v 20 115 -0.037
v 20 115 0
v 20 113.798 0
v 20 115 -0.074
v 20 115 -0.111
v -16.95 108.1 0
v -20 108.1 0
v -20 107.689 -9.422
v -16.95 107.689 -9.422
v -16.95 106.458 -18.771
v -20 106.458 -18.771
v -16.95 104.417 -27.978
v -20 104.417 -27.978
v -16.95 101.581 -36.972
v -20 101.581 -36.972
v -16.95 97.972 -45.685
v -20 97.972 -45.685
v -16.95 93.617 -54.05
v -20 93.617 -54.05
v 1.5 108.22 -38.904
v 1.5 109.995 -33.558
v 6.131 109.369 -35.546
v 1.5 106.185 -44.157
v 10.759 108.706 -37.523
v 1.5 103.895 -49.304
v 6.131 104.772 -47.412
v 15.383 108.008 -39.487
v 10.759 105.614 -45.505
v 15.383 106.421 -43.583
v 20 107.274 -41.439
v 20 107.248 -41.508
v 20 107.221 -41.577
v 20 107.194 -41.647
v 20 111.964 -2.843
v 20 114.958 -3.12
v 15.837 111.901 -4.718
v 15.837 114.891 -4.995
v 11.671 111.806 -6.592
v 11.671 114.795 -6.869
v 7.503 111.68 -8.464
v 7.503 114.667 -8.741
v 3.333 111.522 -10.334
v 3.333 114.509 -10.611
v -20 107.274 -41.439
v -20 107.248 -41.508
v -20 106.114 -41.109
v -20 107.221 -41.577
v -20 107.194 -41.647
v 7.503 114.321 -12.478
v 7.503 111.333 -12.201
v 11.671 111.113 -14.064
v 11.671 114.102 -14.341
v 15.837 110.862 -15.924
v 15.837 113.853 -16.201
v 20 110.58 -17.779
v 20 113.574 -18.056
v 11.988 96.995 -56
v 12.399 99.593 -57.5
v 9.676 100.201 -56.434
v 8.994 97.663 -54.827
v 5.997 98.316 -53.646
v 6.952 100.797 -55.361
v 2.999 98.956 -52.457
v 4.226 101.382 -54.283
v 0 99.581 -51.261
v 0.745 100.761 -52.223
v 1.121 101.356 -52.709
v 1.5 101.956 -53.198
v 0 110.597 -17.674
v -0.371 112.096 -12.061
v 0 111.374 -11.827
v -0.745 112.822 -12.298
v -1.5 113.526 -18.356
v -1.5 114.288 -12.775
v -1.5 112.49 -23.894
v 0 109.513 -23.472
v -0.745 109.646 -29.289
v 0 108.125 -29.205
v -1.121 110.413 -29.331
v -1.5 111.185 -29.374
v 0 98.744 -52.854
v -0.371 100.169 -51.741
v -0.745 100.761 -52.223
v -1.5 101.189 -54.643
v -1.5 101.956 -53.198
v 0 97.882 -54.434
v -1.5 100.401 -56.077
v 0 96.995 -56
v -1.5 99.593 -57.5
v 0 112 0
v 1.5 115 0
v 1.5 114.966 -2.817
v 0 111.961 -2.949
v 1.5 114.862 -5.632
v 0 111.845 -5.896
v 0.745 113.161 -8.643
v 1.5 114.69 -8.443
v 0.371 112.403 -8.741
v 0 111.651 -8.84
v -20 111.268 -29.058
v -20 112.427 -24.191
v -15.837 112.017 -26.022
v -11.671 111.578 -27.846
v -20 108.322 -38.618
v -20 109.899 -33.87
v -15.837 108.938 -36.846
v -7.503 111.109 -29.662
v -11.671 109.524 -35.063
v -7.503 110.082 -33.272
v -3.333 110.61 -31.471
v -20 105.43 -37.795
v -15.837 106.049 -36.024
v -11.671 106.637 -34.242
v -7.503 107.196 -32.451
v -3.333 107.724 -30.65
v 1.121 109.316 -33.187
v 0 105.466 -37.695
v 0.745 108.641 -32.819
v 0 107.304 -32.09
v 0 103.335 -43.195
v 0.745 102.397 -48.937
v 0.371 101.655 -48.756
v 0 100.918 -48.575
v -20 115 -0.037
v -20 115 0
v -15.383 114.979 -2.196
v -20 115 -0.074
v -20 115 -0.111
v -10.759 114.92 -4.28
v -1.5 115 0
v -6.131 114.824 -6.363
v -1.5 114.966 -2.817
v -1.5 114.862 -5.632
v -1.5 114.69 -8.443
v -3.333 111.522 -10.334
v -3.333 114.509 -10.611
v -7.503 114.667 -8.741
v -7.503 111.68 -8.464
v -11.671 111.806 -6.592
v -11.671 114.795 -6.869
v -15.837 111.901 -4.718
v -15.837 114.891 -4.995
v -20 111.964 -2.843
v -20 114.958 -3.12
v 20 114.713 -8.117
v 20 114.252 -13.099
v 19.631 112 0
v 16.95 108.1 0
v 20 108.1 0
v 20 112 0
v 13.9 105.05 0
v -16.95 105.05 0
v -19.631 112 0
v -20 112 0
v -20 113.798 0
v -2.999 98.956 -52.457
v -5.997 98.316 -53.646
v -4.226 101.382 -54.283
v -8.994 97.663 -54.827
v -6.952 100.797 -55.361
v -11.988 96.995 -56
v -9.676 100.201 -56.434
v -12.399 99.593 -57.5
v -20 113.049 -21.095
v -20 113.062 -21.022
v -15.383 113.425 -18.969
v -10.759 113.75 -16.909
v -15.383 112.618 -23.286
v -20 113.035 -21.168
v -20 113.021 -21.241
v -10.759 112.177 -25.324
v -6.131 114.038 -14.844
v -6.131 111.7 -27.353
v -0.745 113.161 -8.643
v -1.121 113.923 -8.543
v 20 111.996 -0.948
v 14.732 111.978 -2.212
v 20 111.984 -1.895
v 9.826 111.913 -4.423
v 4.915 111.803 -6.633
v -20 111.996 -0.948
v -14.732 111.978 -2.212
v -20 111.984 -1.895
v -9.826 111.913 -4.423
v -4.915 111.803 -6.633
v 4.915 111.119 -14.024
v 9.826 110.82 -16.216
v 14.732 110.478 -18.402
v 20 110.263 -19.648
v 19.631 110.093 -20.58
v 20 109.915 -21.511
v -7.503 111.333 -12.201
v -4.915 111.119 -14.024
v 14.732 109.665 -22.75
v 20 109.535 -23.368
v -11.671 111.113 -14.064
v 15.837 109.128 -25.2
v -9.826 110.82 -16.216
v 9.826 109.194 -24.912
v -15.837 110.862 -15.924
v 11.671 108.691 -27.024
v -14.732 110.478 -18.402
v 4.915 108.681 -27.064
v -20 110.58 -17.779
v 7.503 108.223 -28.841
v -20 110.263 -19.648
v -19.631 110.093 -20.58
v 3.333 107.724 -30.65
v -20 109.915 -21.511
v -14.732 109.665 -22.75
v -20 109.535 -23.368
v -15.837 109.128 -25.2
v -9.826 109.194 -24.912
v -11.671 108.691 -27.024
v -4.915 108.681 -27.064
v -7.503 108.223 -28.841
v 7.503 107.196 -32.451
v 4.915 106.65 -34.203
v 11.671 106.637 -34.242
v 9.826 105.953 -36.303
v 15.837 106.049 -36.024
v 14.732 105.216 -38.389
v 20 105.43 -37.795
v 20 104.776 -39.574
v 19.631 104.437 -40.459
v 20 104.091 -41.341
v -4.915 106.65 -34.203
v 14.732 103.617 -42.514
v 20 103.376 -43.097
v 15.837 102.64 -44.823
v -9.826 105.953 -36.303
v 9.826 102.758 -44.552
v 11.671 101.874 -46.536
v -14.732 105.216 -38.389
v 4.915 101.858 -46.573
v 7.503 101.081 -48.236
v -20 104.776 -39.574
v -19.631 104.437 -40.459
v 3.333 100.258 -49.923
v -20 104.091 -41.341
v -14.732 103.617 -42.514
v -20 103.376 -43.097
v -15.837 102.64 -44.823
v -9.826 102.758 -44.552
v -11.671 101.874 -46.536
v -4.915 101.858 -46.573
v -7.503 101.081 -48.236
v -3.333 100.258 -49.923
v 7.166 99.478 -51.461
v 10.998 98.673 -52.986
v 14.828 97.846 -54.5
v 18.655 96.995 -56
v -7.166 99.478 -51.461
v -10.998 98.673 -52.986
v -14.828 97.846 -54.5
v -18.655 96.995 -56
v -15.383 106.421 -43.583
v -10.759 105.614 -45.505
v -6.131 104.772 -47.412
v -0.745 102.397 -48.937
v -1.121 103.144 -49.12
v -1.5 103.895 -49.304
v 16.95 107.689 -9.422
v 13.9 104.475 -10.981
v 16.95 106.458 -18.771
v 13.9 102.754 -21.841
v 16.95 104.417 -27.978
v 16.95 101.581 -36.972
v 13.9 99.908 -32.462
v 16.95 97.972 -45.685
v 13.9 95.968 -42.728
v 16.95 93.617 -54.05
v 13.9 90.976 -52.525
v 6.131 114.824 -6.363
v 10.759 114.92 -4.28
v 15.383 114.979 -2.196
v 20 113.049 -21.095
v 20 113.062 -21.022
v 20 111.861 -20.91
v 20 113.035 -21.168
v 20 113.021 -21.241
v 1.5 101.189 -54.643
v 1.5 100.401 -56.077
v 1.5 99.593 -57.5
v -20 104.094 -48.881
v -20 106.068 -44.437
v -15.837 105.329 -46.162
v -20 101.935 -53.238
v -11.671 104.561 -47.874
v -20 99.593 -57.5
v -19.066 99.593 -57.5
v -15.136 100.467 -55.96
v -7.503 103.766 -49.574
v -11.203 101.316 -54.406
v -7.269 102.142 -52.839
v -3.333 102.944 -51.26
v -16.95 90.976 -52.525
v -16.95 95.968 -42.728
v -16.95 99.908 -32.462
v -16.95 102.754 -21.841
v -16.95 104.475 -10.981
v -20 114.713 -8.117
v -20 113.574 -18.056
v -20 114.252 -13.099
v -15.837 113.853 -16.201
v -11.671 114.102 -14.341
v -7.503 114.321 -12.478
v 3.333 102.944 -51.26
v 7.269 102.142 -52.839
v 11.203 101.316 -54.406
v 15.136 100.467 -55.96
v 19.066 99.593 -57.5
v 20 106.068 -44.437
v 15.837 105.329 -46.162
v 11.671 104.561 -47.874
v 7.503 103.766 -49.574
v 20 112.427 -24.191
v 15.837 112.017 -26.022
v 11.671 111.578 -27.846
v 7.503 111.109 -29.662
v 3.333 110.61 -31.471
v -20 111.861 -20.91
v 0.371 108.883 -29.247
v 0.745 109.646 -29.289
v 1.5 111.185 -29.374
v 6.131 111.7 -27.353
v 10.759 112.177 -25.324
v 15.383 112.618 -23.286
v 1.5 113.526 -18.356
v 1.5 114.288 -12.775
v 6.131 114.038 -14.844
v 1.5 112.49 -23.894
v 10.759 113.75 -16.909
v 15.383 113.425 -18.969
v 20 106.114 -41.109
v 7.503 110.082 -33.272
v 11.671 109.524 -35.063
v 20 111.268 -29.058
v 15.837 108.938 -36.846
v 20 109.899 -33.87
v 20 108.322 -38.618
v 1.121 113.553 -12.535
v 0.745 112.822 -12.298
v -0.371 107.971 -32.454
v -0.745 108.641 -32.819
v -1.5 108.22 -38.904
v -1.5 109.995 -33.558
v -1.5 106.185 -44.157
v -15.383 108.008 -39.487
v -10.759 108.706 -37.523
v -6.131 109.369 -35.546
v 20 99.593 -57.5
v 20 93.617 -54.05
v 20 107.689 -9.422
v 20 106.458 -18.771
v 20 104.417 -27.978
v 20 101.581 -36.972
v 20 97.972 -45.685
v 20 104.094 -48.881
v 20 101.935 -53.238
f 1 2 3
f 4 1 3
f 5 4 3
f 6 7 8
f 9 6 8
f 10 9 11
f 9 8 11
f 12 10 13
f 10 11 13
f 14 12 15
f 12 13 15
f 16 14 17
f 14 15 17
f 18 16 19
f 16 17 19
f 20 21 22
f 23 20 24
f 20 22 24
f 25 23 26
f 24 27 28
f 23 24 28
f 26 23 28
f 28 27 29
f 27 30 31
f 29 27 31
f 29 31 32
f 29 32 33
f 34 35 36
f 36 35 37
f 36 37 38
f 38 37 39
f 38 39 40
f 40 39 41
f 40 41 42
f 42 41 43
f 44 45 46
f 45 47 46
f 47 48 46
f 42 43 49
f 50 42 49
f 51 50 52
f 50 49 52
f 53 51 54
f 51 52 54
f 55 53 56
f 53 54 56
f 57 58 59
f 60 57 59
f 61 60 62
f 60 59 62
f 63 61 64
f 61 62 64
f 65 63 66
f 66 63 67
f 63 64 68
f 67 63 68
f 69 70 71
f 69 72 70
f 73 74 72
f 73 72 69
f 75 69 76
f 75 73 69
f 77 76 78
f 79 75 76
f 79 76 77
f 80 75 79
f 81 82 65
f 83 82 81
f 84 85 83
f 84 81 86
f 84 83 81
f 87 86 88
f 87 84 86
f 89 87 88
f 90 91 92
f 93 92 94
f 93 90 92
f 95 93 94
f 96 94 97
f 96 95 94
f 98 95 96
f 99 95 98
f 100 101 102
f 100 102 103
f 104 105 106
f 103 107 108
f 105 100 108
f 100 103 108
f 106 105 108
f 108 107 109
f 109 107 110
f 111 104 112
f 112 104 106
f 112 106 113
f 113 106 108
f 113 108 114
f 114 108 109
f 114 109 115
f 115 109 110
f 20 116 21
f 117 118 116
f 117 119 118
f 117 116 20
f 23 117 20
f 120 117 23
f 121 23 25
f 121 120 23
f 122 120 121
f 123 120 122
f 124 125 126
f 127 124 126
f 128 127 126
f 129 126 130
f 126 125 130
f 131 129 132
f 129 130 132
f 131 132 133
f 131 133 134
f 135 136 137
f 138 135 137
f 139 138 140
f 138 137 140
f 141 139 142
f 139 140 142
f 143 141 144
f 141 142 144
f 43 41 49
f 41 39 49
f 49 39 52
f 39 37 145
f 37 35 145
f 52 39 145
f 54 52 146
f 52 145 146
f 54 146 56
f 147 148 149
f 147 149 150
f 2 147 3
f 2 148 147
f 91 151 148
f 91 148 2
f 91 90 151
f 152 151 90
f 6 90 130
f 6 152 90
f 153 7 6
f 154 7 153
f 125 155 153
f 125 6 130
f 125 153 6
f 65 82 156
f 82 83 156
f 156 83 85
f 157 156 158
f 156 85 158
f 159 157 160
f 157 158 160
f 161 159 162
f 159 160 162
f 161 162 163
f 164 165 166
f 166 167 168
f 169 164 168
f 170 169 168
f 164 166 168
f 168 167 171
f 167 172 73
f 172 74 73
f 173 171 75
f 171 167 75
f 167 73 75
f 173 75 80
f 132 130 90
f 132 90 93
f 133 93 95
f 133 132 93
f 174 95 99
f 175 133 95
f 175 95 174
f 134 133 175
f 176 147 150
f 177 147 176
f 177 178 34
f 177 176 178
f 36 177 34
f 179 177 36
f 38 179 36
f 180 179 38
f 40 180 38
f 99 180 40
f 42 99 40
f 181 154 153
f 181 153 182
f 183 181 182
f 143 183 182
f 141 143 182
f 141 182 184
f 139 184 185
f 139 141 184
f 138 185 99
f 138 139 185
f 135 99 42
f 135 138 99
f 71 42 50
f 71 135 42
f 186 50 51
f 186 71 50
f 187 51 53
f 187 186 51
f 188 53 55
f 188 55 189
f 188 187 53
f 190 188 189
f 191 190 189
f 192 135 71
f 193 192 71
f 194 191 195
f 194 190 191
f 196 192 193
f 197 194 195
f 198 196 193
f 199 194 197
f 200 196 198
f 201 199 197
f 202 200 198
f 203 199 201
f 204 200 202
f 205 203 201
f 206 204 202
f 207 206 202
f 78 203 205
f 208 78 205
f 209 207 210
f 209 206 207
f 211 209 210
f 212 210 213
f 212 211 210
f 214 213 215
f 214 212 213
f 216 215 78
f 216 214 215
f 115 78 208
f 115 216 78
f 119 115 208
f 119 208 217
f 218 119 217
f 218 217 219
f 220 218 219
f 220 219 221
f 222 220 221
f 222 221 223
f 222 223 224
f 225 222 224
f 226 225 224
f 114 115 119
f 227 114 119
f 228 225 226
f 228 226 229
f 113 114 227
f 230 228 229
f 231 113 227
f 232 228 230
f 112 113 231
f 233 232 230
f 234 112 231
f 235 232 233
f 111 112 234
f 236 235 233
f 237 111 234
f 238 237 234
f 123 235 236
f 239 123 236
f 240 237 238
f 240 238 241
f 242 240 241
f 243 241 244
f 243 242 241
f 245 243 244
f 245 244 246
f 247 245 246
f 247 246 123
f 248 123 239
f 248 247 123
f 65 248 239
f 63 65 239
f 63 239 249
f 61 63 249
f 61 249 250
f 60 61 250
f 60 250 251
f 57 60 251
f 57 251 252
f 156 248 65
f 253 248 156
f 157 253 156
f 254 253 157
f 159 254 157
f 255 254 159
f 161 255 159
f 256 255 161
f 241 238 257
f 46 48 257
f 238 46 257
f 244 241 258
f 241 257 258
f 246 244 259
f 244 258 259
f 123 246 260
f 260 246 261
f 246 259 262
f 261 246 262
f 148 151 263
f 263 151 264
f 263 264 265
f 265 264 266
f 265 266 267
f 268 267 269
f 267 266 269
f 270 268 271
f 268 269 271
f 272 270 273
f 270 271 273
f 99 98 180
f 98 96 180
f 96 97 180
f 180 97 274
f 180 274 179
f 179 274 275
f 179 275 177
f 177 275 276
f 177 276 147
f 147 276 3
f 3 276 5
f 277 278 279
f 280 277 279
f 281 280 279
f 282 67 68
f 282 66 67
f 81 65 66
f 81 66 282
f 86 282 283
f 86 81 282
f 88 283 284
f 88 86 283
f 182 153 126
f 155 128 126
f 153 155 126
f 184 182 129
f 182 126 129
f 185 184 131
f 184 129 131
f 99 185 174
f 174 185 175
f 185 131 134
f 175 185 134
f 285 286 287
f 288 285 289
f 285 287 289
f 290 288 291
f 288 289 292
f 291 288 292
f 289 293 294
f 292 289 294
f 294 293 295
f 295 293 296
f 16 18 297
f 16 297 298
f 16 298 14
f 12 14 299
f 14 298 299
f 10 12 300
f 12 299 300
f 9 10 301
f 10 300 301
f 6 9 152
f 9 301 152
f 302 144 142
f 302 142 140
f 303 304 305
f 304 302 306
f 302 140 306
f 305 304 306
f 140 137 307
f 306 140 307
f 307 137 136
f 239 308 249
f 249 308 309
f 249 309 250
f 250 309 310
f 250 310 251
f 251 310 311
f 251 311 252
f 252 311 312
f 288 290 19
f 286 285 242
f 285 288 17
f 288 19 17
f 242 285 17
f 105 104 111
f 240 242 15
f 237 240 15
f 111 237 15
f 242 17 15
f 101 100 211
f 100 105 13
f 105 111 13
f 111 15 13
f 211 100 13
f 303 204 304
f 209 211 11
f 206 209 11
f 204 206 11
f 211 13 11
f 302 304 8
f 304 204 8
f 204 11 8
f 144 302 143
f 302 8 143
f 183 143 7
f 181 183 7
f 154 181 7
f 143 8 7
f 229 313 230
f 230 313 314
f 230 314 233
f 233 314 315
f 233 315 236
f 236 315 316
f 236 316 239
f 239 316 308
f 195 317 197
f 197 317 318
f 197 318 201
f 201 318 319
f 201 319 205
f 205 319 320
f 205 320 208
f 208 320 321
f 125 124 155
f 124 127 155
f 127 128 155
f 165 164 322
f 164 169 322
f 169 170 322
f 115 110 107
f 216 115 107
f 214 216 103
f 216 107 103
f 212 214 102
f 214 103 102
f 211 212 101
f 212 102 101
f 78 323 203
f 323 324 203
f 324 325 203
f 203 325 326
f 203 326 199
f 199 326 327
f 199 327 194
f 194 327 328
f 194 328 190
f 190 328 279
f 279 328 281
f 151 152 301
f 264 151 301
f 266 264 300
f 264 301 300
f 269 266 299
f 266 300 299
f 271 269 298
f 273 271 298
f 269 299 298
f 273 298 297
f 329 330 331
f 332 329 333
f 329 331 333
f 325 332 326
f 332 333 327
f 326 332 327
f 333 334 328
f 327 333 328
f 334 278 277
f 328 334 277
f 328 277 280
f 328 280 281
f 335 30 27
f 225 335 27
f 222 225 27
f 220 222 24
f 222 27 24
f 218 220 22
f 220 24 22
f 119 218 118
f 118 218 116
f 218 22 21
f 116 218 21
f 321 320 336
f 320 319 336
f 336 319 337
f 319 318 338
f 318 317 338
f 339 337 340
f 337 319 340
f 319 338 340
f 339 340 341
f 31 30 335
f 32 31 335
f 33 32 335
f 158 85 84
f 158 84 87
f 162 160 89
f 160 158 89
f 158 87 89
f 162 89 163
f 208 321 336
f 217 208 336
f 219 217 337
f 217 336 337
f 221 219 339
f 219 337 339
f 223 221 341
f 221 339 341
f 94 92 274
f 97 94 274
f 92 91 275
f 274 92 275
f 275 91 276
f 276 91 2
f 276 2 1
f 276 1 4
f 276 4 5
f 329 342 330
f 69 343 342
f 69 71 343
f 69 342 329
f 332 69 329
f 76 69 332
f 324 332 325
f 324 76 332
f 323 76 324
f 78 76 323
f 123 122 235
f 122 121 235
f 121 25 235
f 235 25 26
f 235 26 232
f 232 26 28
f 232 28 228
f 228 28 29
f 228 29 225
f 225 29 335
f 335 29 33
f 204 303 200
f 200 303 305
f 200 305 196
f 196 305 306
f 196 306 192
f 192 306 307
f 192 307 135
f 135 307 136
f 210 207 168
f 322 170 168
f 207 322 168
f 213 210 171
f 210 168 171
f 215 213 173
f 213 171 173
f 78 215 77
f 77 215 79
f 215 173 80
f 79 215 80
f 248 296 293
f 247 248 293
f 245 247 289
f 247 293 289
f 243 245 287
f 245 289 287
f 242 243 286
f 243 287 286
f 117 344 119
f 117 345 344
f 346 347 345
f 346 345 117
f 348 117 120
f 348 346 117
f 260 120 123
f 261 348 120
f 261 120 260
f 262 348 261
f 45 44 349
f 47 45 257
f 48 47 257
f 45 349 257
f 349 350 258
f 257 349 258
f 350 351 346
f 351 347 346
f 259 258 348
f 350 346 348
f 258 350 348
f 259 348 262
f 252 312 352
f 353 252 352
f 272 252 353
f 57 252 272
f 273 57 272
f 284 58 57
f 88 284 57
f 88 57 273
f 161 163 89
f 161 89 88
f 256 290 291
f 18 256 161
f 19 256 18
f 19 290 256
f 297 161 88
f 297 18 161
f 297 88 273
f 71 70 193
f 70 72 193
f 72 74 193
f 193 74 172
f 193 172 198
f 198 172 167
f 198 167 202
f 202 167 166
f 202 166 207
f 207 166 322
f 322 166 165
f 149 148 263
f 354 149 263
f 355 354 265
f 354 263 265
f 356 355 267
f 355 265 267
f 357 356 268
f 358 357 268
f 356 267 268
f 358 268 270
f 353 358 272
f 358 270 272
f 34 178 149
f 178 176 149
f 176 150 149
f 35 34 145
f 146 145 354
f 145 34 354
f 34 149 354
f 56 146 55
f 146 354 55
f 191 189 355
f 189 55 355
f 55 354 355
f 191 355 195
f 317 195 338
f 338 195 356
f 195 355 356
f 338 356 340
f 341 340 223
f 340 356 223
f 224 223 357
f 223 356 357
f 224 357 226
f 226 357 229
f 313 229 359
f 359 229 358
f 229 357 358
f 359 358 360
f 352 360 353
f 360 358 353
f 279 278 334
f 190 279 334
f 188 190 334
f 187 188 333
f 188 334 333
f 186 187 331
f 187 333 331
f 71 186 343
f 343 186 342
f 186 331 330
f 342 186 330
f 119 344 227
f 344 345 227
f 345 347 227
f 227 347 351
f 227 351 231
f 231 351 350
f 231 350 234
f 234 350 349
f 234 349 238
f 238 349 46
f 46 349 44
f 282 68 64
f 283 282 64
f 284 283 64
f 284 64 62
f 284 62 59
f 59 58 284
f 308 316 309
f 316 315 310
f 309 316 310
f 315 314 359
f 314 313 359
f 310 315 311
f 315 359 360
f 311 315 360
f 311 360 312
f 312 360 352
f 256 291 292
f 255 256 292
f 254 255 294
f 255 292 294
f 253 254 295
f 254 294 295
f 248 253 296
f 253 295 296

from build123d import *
from build123d.topology import SkipClean

# Parameters (mm, degrees)
CUT_EXTRUDE1_REACH      = 261.709
CUT_EXTRUDE1_END_RADIUS = 112
CIRPATTERN1_COUNT       = 34
SKETCH5_OUTSIDE_W       = 297.544
SKETCH5_OUTSIDE_H       = 297.544
CUT_EXTRUDE2_DEPTH      = 168.481342244


with BuildPart() as part:
    # Sketch1 → Revolve1 (revolve)
    with BuildSketch(Plane.XY, mode=Mode.PRIVATE) as revolve1_sk:
        Polygon((-20, 115), (20, 115), (20, 108.1), (16.95, 108.1), (13.9, 105.05), (-16.95, 105.05), (-16.95, 108.1), (-20, 108.1), align=None)
    revolve(revolve1_sk.sketch.rotate(Axis((22, 0, 0), (-1, 0, 0)), 90), axis=Axis((22, 0, 0), (-1, 0, 0)))

    # Cut-Extrude1: up to this cylinder (the profile starts outside it)
    cut_extrude1_end = Plane(origin=(0, 0, 0), z_dir=(-1, 0, 0)) * Cylinder(CUT_EXTRUDE1_END_RADIUS, 748.418, mode=Mode.PRIVATE)
    # Sketch3 → Cut-Extrude1 (cut, up to the surface)
    with BuildSketch(Plane.XY.offset(117), mode=Mode.PRIVATE) as cut_extrude1_sk1:
        Polygon((-20, 7.5), (-3.333333333, 0), (-20, -7.5), (-20, -10.5), (0, -1.5), (20, -10.5), (20, -7.5), (3.333333333, 0), (20, 7.5), (20, 10.5), (0, 1.5), (-20, 10.5), align=None)
    cut_extrude1_tool1 = extrude(cut_extrude1_sk1.sketch, amount=-CUT_EXTRUDE1_REACH, mode=Mode.PRIVATE) - cut_extrude1_end
    cut_extrude1 = cut_extrude1_tool1.solids().sort_by_distance((0, 0, 117))[0]
    add(cut_extrude1, mode=Mode.SUBTRACT)

    # CirPattern1: Cut-Extrude1 ×34 about axis
    with SkipClean():  # the faces are left unmerged after this step: merging them gives an invalid solid
        cirpattern1_axis = Axis((0, 0, 0), (1, 0, 0))
        for i in range(1, CIRPATTERN1_COUNT):
            add(cut_extrude1.rotate(cirpattern1_axis, i * 360 / CIRPATTERN1_COUNT), mode=Mode.SUBTRACT)

    # Sketch4 → Cut-Revolve1 (revolve, cut)
    with SkipClean():  # the faces are left unmerged after this step: merging them gives an invalid solid
        with BuildSketch(Plane.XY, mode=Mode.PRIVATE) as cut_revolve1_sk:
            Polygon((-1.5, 115), (1.5, 115), (0, 112), align=None)
        revolve(cut_revolve1_sk.sketch.rotate(Axis((22, 0, 0), (-1, 0, 0)), 270), axis=Axis((22, 0, 0), (-1, 0, 0)), mode=Mode.SUBTRACT)

    # Sketch5 outside → Cut-Extrude2 (cut, through all)
    with BuildSketch(Plane.ZY.offset(20)):
        Rectangle(SKETCH5_OUTSIDE_W, SKETCH5_OUTSIDE_H)
        with BuildLine():
            Line((0, 0), (0, 124.880273578))
            ThreePointArc((0, 124.880273578), (-34.133726301, 125.732826073), (-66.737856602, 115.593358423))
            Line((-66.737856602, 115.593358423), (0, 0))
        make_face(mode=Mode.SUBTRACT)
    extrude(amount=-CUT_EXTRUDE2_DEPTH, mode=Mode.SUBTRACT)


solid = part.part
